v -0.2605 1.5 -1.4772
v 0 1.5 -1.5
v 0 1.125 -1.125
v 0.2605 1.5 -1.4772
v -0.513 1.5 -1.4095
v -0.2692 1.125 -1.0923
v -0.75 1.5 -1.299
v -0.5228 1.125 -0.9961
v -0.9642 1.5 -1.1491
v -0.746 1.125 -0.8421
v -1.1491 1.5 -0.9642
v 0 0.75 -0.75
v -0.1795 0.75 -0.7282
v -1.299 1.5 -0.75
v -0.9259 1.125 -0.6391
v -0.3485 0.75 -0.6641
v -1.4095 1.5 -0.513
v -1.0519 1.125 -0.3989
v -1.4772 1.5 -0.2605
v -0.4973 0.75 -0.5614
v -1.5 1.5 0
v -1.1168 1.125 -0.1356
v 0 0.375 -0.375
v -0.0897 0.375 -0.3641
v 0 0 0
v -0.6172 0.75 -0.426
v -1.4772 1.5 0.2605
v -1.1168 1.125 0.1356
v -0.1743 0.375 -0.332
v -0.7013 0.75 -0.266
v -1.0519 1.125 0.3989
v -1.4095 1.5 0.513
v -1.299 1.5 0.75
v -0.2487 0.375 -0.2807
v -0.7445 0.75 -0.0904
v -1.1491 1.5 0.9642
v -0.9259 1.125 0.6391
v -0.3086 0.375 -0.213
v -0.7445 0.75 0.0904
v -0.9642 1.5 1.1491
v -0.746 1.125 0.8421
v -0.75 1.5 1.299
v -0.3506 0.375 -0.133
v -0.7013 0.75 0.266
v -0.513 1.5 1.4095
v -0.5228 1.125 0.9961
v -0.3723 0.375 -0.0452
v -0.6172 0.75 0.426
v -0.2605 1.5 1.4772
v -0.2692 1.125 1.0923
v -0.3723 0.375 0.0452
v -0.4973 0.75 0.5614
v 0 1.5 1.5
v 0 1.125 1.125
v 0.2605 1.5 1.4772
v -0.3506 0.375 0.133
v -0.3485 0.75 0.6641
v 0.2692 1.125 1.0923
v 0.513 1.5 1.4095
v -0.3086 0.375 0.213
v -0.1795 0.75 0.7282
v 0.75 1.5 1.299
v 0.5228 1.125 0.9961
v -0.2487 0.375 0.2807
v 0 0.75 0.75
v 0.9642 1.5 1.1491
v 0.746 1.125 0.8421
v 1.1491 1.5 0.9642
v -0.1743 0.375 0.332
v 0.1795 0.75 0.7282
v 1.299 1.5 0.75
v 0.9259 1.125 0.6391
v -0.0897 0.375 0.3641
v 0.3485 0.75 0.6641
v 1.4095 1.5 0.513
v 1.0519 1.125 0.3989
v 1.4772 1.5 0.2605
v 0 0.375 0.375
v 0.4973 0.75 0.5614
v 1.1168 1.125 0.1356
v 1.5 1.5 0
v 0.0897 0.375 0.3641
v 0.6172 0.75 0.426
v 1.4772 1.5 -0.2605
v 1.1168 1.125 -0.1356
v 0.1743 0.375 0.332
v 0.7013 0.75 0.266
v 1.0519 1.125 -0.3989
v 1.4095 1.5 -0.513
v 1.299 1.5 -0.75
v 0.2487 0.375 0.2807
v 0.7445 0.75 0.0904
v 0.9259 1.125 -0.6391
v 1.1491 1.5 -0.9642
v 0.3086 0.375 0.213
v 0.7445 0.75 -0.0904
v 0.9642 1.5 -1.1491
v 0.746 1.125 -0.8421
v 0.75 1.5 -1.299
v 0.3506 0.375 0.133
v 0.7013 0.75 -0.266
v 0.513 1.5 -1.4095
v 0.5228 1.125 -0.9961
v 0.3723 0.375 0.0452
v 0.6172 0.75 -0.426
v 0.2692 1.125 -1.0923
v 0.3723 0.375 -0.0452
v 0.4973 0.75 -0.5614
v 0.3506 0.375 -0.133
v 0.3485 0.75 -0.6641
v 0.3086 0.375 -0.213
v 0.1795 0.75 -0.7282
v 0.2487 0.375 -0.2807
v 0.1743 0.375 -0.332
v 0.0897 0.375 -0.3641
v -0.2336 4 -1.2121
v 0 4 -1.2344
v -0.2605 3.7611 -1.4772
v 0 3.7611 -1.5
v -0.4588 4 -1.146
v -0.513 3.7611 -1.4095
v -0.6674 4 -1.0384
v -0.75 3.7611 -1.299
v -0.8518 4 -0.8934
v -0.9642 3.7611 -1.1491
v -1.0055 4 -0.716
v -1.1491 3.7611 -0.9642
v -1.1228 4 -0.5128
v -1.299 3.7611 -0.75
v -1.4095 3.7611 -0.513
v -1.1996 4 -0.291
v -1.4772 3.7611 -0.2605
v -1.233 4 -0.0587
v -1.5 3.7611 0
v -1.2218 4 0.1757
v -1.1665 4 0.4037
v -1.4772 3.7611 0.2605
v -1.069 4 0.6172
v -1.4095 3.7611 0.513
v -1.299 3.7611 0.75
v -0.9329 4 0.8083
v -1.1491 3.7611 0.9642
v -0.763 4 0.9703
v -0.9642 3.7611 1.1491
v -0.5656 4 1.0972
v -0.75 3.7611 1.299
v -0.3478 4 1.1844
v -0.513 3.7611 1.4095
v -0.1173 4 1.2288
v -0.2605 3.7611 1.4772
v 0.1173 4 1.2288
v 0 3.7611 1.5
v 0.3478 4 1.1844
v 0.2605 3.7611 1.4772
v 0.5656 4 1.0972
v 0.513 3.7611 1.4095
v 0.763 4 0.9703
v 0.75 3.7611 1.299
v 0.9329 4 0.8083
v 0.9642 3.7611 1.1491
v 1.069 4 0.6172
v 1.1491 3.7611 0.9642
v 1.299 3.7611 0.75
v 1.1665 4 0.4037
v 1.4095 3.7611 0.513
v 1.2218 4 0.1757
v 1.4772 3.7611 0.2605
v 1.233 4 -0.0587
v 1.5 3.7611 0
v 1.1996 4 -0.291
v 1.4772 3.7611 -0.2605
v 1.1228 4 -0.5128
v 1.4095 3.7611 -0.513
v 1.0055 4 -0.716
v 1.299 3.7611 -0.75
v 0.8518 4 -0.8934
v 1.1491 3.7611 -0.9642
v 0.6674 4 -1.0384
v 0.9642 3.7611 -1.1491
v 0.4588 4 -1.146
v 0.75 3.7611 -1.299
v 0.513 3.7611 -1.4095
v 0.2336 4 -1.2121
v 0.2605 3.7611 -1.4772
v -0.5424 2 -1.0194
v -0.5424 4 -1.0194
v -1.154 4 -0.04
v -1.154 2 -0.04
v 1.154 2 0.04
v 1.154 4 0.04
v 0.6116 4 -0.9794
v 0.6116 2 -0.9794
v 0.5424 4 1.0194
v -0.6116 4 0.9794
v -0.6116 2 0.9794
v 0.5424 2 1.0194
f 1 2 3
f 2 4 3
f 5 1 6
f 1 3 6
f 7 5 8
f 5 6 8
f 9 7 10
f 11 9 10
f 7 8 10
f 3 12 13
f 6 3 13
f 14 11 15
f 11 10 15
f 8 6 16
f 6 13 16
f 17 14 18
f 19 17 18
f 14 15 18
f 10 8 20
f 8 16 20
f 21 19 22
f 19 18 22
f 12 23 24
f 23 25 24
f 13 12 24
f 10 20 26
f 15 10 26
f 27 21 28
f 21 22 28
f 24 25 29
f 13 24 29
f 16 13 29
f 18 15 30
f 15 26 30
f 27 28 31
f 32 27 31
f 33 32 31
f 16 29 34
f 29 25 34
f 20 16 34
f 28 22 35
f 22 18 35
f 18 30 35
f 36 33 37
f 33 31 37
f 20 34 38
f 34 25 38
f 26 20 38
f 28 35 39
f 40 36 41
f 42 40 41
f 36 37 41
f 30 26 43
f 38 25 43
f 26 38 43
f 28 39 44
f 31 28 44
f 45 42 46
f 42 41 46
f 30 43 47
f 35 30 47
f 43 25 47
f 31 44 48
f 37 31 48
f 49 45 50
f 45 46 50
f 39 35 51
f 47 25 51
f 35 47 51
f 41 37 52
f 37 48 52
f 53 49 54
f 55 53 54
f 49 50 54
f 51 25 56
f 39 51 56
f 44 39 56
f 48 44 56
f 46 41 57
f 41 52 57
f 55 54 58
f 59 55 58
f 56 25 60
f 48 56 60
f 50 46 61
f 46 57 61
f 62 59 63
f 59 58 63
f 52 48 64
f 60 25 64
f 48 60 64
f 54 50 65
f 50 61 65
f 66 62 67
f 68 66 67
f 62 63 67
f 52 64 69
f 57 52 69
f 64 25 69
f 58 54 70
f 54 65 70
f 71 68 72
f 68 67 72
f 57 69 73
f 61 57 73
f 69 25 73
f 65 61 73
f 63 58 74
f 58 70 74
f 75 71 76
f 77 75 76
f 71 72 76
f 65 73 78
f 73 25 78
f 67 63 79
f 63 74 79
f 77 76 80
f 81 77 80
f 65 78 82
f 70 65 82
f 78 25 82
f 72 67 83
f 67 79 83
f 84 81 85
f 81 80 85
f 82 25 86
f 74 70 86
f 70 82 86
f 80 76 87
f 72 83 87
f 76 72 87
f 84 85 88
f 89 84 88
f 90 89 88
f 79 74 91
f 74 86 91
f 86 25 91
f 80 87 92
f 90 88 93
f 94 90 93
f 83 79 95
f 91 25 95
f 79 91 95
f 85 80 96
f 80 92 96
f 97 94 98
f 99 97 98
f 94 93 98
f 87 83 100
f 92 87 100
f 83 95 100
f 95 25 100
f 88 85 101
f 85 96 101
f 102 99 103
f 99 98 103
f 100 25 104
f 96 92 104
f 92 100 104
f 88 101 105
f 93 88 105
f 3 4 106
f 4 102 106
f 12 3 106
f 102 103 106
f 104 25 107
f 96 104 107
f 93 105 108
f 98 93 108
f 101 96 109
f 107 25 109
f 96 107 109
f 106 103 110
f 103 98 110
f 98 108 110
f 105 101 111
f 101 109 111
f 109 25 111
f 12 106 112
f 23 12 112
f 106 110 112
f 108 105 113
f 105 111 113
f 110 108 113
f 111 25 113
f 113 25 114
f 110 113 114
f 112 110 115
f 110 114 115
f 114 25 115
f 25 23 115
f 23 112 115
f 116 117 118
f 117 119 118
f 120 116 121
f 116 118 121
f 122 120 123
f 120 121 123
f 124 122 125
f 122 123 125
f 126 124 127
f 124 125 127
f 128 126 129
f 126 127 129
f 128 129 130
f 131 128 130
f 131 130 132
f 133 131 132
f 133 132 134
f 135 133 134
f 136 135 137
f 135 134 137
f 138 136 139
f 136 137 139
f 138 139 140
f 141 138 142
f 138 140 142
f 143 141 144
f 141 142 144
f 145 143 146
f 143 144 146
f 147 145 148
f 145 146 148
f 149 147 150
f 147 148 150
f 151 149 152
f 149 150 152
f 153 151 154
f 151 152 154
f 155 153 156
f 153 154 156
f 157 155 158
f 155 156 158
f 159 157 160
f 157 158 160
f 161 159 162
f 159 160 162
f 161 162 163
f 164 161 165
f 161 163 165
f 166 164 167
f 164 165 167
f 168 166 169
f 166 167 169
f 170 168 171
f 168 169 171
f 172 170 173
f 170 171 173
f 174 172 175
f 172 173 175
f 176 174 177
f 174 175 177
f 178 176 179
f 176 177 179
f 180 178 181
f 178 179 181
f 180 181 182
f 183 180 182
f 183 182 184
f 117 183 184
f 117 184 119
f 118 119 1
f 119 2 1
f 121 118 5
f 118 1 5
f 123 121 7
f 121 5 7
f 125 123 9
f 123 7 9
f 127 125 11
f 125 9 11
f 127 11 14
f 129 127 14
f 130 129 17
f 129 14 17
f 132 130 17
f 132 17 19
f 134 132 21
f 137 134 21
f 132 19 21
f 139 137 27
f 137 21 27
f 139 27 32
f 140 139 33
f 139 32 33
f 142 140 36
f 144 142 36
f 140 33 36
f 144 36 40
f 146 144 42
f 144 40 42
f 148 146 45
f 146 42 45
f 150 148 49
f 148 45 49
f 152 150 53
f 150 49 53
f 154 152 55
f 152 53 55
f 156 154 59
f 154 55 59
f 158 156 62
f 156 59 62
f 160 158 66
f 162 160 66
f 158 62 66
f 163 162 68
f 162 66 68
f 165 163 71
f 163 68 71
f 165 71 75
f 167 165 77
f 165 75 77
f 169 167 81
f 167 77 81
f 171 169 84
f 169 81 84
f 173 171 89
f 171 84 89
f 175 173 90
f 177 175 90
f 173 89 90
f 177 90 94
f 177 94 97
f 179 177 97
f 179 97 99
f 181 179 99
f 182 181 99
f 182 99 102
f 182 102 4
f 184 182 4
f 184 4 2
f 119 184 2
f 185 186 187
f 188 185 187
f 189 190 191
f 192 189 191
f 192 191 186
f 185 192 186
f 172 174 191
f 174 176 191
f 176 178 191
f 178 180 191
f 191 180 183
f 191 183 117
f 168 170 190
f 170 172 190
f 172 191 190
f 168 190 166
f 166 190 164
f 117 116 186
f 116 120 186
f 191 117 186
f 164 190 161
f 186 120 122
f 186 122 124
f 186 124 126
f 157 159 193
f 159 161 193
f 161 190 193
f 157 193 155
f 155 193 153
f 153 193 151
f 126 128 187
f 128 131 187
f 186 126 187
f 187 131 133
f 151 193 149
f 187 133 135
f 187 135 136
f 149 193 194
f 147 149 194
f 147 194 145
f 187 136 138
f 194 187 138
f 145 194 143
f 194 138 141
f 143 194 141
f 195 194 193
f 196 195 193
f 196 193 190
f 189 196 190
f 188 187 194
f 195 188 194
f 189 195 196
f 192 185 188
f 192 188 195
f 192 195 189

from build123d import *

# Parameters (mm, degrees)
CUT_EXTRUDE_1_DEPTH = 2


with BuildPart() as part:
    # Эскиз1 → Повернуть1 (revolve)
    with BuildSketch(Plane.XY, mode=Mode.PRIVATE) as revolve_1_sk:
        Polygon((0, 0), (0, 4), (-1.234377132, 4), (-1.5, 3.761099228), (-1.5, 1.5), align=None)
    revolve(revolve_1_sk.sketch.rotate(Axis((0, 0, 0), (0, 1, 0)), 270), axis=Axis((0, 0, 0), (0, 1, 0)))

    # Эскиз2 → Вырез-Вытянуть1 (cut)
    with BuildSketch(Plane(origin=(0, 4, 0), x_dir=(1, 0, 0), z_dir=(0, 1, 0))):
        Polygon((-0.611612581, -0.979419922), (0.542396243, -1.019381994), (1.154008824, -0.039962072), (0.611612581, 0.979419922), (-0.542396243, 1.019381994), (-1.154008824, 0.039962072), align=None)
    extrude(amount=-CUT_EXTRUDE_1_DEPTH, mode=Mode.SUBTRACT)


solid = part.part
